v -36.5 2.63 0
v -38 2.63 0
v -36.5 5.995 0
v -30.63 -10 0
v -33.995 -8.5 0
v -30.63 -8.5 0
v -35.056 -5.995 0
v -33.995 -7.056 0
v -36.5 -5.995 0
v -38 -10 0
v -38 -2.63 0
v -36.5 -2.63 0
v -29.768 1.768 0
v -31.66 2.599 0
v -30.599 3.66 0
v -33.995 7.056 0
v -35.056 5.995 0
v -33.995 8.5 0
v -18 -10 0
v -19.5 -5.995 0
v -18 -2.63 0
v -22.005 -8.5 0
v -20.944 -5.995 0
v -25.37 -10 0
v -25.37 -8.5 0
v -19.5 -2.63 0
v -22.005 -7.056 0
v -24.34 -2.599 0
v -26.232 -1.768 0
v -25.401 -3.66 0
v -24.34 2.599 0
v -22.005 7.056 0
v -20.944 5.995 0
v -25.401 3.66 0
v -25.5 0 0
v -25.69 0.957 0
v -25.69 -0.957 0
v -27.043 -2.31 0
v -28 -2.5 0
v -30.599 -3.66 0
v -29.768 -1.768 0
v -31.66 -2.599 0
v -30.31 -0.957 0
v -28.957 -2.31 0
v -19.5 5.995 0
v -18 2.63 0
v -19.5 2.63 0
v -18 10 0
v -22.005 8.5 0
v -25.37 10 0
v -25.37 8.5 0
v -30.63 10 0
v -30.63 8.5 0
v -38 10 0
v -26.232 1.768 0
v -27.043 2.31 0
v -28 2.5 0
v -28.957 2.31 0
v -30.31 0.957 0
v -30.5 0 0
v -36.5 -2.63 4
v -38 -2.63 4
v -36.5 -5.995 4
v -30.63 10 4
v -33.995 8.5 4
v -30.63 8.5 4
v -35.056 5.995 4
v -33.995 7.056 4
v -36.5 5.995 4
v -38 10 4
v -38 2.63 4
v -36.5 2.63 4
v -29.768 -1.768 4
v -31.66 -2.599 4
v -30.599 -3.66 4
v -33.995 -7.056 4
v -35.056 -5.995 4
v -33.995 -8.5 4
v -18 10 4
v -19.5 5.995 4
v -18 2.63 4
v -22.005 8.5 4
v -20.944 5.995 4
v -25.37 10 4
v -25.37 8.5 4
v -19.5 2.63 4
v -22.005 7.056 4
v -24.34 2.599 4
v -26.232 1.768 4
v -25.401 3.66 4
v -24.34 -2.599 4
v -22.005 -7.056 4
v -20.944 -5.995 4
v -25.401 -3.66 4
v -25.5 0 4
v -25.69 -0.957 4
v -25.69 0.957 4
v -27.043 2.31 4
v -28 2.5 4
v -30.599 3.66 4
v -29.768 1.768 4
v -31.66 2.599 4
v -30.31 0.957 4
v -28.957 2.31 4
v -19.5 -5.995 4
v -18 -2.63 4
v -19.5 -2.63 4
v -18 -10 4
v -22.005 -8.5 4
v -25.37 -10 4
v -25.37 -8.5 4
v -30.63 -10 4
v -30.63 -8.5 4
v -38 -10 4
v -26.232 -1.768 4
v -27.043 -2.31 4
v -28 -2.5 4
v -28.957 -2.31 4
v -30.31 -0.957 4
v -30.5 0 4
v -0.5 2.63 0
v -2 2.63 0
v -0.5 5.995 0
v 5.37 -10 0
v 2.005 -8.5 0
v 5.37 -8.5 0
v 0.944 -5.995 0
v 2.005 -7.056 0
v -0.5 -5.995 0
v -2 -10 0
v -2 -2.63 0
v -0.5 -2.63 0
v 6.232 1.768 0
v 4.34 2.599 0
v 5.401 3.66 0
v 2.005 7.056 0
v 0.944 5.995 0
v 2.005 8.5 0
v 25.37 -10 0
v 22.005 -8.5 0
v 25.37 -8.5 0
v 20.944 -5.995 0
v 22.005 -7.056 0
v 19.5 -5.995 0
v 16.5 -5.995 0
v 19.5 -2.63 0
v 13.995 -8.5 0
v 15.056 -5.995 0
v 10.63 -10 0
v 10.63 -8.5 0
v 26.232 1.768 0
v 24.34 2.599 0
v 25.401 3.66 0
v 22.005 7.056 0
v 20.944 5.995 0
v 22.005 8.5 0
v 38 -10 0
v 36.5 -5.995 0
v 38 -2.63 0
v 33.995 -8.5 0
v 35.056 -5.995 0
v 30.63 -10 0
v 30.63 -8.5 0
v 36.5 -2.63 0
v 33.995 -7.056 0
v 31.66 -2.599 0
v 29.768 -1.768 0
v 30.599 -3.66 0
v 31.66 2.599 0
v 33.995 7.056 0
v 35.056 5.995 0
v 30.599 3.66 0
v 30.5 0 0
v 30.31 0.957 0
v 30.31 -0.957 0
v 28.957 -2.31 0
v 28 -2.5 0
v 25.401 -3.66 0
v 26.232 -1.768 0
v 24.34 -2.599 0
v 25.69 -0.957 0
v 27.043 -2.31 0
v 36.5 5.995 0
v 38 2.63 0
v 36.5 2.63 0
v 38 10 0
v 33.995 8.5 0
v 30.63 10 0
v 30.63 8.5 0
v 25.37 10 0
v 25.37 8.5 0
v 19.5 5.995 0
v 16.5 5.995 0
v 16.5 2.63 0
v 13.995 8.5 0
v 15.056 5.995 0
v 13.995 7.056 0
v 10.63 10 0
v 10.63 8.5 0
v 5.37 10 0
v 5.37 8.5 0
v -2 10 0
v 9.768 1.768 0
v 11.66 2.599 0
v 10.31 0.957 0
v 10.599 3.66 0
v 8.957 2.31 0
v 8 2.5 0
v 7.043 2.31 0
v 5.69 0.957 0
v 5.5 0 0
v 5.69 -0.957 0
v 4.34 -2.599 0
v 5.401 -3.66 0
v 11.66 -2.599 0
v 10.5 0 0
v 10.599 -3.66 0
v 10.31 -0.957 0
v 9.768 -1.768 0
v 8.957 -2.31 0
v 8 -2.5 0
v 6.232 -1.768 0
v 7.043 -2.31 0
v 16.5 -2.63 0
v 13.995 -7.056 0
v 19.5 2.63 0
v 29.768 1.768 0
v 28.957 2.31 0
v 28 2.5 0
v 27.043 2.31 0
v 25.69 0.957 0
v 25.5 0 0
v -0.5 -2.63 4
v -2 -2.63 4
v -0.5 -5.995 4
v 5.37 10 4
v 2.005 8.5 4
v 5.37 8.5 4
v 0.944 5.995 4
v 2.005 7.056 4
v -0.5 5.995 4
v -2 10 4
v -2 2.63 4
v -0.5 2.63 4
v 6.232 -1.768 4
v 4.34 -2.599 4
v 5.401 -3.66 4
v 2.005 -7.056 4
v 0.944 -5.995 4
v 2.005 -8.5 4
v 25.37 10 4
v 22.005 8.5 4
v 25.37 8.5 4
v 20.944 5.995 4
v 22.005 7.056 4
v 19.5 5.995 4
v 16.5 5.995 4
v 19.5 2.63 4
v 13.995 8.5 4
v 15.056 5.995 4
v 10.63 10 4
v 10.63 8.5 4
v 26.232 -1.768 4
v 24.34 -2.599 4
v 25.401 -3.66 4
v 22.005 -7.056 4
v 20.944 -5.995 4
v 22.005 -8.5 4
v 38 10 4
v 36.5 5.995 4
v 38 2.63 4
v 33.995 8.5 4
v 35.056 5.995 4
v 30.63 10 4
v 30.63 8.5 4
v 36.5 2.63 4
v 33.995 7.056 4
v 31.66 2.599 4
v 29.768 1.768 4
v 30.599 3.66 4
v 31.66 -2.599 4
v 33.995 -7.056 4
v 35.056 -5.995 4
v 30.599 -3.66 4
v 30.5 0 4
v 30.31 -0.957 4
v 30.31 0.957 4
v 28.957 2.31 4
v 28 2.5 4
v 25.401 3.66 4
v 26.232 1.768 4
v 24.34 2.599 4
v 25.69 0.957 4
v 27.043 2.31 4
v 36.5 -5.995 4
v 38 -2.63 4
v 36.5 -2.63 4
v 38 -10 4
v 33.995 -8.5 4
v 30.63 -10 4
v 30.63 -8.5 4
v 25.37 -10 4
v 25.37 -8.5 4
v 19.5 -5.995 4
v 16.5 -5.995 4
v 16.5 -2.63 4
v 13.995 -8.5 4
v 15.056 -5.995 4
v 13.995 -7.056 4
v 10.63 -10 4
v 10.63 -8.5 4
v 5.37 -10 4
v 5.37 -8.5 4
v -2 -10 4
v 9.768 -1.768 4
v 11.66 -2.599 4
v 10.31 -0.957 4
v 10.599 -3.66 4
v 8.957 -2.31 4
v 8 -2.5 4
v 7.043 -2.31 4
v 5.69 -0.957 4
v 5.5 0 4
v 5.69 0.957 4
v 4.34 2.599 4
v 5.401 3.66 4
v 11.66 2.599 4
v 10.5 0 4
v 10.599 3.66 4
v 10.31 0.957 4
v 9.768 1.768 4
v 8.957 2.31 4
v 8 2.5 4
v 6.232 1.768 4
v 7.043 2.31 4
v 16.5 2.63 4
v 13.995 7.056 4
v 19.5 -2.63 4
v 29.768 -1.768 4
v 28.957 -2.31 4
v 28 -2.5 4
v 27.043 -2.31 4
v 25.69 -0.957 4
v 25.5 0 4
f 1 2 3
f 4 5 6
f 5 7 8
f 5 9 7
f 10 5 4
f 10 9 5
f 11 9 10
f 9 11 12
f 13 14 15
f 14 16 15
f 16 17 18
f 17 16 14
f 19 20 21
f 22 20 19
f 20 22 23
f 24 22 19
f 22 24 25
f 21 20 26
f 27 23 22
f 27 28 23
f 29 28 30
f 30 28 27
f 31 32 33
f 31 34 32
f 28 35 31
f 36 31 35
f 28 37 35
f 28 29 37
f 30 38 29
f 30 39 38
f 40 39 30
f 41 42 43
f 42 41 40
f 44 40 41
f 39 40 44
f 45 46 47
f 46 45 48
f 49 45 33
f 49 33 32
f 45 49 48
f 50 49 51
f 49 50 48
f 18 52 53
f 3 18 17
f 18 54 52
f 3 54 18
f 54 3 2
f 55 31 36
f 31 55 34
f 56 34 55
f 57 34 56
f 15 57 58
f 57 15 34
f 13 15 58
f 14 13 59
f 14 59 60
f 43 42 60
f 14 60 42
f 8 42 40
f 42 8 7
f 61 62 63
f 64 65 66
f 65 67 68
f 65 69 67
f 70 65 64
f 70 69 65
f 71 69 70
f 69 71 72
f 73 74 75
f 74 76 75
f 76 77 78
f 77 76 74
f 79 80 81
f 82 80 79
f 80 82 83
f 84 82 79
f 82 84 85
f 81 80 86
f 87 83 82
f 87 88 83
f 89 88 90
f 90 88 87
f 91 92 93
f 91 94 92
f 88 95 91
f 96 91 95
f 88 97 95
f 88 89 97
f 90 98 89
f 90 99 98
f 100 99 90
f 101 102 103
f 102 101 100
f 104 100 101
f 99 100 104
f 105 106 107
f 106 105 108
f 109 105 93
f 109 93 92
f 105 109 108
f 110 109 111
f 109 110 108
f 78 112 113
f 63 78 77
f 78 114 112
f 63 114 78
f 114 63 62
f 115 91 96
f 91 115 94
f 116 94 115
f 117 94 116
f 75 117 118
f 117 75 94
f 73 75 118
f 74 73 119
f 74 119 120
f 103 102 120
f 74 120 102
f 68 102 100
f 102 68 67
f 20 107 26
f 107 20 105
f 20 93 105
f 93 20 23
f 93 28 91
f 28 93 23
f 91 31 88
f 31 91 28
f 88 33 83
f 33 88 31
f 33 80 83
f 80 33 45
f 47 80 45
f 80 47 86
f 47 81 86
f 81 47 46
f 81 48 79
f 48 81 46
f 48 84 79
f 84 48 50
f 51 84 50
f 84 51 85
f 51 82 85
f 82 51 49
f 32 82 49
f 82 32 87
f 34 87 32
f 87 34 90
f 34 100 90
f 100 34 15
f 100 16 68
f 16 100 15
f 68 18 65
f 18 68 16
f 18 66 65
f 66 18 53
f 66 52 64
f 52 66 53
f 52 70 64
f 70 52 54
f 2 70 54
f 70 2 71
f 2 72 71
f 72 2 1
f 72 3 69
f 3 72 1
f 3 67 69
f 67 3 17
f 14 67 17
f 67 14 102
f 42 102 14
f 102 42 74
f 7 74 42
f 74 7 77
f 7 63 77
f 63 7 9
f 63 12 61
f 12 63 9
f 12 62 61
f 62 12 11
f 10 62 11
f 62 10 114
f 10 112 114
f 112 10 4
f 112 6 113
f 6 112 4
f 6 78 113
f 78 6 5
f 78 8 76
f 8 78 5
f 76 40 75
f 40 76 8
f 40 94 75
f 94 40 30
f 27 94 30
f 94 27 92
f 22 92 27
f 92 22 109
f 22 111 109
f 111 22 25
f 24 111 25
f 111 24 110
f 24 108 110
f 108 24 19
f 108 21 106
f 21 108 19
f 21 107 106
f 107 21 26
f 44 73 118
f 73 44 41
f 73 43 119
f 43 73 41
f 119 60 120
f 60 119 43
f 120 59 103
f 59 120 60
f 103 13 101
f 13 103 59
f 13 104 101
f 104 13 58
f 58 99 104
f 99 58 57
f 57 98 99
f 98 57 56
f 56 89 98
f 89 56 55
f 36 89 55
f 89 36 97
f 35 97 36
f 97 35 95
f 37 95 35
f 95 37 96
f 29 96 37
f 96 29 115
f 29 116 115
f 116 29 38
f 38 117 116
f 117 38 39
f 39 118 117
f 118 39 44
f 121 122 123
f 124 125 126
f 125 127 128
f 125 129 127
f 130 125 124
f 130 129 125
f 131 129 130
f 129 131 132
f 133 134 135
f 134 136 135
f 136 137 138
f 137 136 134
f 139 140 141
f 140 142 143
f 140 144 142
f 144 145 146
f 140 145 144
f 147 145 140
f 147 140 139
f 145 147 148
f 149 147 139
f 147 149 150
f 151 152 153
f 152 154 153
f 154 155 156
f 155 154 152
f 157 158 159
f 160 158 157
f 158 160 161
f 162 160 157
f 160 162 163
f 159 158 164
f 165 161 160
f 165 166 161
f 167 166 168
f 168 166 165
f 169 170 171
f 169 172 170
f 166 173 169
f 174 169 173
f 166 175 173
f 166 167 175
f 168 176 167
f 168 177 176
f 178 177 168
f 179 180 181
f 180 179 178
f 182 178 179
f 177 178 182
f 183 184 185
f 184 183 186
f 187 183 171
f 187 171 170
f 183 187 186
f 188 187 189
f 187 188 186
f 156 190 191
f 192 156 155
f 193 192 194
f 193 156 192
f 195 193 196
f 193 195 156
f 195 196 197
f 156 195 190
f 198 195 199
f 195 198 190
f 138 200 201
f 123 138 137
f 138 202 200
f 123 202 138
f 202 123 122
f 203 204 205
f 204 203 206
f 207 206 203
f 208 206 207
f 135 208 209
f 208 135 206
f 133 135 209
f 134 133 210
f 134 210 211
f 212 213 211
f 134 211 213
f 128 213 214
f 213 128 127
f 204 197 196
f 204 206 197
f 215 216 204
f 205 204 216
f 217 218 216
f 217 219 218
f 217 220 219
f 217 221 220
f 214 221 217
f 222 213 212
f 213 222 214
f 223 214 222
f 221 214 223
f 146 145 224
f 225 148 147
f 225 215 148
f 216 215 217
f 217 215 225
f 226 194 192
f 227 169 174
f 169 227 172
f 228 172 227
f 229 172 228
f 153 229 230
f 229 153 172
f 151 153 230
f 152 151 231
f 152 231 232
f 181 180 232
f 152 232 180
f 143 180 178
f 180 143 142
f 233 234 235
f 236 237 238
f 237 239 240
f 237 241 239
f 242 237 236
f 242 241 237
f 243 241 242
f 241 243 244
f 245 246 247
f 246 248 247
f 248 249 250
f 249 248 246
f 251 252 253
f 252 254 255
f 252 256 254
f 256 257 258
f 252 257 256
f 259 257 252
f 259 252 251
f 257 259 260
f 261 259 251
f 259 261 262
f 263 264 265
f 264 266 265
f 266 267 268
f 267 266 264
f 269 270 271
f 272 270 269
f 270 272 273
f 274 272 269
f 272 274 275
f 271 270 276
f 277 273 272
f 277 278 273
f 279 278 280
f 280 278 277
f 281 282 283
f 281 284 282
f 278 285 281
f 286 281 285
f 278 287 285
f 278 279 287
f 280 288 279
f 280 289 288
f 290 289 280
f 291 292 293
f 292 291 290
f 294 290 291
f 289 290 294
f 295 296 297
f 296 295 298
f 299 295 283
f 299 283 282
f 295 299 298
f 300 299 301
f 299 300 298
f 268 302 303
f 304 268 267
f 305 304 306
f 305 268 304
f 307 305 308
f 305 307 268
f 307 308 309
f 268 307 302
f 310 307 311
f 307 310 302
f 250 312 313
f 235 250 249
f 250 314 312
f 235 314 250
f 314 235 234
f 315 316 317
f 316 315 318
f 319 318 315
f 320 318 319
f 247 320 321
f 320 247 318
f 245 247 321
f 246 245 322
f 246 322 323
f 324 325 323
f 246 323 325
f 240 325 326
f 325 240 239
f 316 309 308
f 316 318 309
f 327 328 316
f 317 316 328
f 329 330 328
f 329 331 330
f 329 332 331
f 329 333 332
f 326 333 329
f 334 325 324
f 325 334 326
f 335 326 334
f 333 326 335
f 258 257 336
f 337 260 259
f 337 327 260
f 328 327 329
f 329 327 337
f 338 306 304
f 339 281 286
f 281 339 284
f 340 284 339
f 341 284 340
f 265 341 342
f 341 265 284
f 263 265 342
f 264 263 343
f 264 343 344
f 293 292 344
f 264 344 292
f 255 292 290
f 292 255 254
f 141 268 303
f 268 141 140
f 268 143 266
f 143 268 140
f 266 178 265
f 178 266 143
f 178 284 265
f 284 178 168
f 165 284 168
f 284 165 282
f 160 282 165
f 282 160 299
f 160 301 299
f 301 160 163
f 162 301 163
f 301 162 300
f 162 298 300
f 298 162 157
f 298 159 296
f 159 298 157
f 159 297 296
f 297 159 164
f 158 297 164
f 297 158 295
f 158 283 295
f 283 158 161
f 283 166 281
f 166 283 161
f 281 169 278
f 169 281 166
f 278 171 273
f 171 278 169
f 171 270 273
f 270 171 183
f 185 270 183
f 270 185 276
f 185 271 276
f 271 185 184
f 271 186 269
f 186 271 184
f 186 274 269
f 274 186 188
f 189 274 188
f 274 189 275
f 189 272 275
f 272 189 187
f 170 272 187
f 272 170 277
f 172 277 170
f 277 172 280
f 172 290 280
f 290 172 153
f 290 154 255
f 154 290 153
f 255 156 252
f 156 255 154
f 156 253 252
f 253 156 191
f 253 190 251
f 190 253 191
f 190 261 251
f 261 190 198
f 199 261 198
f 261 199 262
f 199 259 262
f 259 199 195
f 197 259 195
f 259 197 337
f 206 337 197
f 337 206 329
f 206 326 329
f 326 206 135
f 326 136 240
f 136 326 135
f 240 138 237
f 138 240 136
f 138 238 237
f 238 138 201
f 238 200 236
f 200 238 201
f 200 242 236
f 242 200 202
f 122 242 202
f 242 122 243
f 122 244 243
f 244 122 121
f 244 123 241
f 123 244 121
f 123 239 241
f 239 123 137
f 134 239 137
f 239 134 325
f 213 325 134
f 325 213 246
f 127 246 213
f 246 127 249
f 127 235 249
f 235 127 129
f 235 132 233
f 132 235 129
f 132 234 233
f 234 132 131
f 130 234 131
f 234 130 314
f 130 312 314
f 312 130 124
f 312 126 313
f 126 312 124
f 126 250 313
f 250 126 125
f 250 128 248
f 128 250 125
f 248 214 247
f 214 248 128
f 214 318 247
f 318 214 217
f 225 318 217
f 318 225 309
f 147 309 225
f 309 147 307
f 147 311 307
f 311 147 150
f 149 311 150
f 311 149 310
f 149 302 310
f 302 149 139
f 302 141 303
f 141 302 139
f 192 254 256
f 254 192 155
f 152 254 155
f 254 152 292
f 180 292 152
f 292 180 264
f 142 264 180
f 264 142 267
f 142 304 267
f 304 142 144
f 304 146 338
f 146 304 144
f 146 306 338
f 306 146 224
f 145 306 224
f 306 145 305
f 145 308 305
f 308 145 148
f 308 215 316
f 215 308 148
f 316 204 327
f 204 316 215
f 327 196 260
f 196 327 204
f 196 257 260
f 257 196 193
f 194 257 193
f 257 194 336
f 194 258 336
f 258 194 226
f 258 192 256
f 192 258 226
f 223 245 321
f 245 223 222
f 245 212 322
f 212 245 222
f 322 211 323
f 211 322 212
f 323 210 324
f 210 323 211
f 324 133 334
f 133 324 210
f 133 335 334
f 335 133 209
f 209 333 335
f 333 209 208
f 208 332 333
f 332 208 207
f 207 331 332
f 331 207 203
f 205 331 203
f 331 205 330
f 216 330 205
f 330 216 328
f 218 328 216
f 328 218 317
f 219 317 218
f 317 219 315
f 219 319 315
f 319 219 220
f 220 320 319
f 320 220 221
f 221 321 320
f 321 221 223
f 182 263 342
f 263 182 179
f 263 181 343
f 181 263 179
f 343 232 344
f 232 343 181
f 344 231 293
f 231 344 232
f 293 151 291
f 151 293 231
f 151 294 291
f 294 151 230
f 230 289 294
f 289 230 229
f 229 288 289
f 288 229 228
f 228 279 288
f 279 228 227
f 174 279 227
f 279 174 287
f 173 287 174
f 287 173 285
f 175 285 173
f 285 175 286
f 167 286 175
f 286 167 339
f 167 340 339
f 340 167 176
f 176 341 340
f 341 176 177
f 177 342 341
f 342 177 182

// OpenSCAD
/* Connected 20-series extrusion cross-section inspection. */
use <laser_parts.scad>

$fn=48;

// Thin slices make the internal topology easy to inspect in Preview/Render.
translate([-28,0,0]) aluminum_extrusion_2020(length=4,black=false);
translate([ 18,0,0]) aluminum_extrusion_2040(length=4,black=false);
